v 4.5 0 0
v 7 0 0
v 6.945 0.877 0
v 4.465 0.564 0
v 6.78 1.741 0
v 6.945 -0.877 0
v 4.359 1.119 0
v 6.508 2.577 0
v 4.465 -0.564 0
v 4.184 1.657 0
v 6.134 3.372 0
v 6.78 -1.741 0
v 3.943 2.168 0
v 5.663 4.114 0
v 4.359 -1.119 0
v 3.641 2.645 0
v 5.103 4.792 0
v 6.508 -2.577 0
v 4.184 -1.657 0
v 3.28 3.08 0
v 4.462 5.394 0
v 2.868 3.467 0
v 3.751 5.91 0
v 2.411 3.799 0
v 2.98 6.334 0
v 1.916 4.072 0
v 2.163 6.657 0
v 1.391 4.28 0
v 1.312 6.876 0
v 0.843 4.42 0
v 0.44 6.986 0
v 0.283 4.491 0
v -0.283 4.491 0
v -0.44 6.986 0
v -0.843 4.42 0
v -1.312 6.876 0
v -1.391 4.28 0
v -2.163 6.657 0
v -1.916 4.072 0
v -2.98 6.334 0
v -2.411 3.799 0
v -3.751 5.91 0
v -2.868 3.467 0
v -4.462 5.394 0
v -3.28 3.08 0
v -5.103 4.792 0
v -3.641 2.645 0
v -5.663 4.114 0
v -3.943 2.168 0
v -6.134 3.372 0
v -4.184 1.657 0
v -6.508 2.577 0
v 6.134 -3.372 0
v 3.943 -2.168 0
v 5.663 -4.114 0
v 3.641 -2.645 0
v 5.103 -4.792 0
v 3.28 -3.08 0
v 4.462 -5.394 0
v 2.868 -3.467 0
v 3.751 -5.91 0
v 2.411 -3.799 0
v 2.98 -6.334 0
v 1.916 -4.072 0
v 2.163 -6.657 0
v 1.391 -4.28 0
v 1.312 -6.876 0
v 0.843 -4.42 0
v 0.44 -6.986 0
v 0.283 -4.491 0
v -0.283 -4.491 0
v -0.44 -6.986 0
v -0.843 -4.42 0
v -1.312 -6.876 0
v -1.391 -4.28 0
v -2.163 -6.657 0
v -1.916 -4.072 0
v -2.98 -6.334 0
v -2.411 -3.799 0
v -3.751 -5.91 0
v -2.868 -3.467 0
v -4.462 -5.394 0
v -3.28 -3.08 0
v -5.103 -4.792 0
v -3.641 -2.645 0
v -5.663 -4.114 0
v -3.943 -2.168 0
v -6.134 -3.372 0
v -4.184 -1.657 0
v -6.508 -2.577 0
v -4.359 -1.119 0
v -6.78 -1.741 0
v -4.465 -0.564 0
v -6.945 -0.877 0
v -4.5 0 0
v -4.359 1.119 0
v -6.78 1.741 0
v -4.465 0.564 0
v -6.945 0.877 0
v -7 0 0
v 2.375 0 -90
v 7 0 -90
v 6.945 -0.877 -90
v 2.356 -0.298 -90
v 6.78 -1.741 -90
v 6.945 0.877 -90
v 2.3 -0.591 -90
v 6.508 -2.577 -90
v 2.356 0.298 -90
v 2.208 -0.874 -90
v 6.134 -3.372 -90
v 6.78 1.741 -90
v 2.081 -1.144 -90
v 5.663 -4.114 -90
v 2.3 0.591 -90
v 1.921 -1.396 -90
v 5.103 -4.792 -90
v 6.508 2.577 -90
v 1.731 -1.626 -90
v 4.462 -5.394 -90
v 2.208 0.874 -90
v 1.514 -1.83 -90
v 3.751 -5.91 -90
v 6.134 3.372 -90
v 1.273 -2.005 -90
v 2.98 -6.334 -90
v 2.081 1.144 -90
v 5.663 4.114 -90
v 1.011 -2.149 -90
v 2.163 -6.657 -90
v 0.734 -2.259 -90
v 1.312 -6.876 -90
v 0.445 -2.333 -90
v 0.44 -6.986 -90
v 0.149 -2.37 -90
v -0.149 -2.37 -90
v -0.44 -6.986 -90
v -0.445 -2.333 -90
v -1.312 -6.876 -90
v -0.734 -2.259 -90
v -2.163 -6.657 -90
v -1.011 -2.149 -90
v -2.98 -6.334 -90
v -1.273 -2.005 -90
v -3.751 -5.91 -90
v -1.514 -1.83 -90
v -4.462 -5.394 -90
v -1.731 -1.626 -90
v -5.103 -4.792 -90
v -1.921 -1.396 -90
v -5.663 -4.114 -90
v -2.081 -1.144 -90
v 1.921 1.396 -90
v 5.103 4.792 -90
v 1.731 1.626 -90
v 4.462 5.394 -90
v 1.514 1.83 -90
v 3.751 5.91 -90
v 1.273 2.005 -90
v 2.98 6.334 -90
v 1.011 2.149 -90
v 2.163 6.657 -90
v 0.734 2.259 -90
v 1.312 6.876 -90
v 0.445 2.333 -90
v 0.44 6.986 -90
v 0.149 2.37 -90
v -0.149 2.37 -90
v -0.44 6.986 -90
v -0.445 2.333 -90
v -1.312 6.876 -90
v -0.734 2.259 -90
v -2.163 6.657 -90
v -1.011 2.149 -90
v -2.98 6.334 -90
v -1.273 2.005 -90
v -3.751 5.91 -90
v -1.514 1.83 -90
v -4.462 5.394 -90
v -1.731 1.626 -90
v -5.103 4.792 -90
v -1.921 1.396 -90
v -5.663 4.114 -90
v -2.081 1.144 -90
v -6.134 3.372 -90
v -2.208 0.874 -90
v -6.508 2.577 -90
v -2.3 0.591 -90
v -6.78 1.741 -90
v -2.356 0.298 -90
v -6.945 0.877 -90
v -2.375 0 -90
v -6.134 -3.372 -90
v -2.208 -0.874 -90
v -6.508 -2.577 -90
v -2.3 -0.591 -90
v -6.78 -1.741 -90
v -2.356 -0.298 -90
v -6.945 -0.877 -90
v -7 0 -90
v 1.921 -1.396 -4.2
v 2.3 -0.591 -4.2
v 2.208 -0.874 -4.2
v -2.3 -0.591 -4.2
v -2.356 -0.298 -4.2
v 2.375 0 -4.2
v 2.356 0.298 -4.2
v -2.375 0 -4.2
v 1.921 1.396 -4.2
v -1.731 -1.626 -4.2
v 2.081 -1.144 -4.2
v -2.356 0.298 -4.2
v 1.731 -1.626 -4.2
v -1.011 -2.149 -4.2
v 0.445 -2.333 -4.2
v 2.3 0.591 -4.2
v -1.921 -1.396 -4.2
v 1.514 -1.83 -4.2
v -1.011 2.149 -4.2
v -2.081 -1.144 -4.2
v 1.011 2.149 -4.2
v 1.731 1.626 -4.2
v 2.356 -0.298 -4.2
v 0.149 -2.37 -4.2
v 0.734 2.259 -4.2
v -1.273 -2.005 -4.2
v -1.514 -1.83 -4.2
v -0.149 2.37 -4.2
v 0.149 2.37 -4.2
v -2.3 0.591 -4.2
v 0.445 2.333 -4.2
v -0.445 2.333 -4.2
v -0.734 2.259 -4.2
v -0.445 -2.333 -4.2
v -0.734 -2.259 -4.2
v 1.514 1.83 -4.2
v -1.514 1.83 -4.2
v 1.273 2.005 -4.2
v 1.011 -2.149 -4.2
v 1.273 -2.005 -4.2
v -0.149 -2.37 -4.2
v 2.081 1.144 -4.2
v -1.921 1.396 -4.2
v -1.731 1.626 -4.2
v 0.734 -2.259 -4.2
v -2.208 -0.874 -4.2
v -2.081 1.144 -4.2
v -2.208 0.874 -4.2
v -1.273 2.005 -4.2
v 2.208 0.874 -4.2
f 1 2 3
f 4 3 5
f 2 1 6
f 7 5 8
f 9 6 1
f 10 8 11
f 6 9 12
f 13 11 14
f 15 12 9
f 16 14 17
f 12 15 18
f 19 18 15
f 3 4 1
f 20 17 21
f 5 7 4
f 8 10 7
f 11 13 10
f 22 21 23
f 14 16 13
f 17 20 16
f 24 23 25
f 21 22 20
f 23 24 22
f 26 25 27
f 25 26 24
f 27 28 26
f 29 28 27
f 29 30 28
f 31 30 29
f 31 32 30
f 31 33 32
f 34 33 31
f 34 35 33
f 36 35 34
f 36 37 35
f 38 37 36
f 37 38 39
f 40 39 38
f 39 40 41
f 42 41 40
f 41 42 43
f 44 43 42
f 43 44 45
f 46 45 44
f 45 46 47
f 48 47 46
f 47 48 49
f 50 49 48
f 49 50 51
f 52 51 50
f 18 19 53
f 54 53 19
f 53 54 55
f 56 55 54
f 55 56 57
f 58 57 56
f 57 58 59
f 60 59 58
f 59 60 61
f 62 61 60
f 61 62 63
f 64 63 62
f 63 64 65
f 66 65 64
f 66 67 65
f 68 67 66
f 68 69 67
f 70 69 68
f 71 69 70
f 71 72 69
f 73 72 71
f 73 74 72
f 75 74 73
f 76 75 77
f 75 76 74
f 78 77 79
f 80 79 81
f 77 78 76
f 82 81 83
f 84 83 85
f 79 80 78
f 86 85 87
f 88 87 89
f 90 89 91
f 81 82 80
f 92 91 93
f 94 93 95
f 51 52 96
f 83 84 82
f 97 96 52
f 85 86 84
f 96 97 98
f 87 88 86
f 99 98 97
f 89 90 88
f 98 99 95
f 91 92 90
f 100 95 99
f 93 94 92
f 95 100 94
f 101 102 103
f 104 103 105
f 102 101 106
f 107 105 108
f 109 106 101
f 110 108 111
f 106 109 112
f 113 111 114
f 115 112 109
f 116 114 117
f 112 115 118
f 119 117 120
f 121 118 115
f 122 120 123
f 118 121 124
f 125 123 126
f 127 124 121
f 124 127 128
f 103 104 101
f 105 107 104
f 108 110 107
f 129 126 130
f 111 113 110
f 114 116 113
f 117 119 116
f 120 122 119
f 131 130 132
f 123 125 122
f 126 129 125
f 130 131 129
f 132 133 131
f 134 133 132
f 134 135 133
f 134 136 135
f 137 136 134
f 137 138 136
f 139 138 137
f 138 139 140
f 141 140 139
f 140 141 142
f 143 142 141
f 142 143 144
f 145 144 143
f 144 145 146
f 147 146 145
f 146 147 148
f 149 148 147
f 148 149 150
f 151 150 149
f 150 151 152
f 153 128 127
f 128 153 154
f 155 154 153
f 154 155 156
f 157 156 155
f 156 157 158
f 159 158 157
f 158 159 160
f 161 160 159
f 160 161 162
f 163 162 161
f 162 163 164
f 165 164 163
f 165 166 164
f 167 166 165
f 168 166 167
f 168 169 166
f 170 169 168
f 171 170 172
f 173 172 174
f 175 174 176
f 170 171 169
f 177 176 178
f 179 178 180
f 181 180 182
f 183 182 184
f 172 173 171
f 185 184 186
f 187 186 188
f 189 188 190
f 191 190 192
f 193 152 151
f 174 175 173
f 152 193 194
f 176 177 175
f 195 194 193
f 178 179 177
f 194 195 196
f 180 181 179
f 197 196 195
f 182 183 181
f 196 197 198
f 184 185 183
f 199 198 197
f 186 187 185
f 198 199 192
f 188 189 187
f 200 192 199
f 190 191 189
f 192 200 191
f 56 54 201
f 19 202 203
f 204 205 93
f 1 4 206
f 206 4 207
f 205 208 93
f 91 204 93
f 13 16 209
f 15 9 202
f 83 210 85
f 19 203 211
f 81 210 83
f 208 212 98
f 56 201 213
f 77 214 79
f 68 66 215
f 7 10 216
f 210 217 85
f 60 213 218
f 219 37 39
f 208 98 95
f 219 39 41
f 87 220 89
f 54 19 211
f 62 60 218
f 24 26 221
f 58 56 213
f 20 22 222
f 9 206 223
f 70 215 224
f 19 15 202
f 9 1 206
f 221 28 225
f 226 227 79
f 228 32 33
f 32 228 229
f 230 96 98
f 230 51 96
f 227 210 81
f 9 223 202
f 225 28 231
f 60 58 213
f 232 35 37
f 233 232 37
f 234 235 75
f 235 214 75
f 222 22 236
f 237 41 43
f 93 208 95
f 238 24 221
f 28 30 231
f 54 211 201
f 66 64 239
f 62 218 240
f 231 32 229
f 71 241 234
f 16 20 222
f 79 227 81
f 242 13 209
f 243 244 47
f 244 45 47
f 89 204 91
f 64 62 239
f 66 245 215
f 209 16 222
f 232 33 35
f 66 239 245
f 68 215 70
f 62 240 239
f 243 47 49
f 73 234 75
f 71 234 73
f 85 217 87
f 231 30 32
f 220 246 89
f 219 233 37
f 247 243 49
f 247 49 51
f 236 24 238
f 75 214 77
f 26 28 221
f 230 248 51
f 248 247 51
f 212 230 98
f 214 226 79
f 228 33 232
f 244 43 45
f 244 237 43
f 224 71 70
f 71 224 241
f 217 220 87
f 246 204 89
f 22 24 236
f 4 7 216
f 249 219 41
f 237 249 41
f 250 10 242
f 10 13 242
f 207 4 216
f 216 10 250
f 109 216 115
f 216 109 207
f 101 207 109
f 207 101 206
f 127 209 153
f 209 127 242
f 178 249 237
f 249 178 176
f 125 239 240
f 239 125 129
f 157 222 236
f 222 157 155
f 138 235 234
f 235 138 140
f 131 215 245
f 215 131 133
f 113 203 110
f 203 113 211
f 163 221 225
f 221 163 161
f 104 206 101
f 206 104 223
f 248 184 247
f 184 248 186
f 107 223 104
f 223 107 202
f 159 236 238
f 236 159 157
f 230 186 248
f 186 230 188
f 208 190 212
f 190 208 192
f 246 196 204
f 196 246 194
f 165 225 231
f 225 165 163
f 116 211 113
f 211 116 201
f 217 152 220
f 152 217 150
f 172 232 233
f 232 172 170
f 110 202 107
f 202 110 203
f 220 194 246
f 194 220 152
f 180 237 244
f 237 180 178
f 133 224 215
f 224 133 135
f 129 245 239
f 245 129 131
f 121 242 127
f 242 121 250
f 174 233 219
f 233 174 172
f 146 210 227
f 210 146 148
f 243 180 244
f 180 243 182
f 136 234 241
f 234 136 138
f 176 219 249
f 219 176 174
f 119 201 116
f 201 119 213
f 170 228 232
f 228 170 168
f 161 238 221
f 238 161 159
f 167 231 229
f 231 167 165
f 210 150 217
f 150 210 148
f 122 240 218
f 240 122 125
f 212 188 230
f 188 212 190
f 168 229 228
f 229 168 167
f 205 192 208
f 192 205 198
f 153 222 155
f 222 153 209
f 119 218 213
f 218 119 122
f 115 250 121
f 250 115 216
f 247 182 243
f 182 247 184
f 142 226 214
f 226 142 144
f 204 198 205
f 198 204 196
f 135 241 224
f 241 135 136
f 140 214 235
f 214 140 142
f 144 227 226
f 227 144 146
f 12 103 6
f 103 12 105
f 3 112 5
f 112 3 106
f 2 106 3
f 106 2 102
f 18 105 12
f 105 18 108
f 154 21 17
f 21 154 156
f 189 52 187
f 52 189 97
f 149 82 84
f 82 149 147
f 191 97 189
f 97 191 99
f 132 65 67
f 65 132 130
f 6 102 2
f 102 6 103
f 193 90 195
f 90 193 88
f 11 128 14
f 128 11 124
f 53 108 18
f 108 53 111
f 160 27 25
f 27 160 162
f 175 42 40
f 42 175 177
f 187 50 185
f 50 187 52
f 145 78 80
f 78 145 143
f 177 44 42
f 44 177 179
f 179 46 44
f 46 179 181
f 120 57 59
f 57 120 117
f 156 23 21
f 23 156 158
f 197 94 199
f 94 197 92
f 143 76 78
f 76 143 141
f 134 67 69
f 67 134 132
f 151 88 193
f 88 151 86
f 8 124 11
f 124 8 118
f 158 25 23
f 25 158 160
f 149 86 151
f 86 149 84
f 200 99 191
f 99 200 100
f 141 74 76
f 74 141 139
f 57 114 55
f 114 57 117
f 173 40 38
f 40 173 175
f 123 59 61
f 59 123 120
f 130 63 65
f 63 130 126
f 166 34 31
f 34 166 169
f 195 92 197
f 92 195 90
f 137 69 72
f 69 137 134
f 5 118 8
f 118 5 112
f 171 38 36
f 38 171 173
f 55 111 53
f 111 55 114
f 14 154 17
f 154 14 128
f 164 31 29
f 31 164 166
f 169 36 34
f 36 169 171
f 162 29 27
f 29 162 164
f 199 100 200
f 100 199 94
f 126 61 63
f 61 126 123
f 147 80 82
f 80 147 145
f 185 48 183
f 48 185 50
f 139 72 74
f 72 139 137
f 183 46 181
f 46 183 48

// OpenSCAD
$fn = 50;


difference() {
	union() {
		translate(v = [0, 0, -90.0000000000]) {
			cylinder(h = 90, r = 7.0000000000);
		}
		cylinder(h = 0, r = 10.0000000000);
	}
	union() {
		translate(v = [0, 0, 0]) {
			rotate(a = [0, 0, 0]) {
				difference() {
					union() {
						#translate(v = [0, 0, -90.0000000000]) {
							cylinder(h = 90, r = 2.2500000000);
						}
						#translate(v = [0, 0, -4.2000000000]) {
							cylinder(h = 4.2000000000, r = 7.0000000000, r1 = 2.3750000000, r2 = 4.5000000000);
						}
						#translate(v = [0, 0, -90.0000000000]) {
							cylinder(h = 90, r = 2.3750000000);
						}
						#translate(v = [0, 0, -90.0000000000]) {
							cylinder(h = 90, r = 2.2500000000);
						}
					}
					union();
				}
			}
		}
	}
}
